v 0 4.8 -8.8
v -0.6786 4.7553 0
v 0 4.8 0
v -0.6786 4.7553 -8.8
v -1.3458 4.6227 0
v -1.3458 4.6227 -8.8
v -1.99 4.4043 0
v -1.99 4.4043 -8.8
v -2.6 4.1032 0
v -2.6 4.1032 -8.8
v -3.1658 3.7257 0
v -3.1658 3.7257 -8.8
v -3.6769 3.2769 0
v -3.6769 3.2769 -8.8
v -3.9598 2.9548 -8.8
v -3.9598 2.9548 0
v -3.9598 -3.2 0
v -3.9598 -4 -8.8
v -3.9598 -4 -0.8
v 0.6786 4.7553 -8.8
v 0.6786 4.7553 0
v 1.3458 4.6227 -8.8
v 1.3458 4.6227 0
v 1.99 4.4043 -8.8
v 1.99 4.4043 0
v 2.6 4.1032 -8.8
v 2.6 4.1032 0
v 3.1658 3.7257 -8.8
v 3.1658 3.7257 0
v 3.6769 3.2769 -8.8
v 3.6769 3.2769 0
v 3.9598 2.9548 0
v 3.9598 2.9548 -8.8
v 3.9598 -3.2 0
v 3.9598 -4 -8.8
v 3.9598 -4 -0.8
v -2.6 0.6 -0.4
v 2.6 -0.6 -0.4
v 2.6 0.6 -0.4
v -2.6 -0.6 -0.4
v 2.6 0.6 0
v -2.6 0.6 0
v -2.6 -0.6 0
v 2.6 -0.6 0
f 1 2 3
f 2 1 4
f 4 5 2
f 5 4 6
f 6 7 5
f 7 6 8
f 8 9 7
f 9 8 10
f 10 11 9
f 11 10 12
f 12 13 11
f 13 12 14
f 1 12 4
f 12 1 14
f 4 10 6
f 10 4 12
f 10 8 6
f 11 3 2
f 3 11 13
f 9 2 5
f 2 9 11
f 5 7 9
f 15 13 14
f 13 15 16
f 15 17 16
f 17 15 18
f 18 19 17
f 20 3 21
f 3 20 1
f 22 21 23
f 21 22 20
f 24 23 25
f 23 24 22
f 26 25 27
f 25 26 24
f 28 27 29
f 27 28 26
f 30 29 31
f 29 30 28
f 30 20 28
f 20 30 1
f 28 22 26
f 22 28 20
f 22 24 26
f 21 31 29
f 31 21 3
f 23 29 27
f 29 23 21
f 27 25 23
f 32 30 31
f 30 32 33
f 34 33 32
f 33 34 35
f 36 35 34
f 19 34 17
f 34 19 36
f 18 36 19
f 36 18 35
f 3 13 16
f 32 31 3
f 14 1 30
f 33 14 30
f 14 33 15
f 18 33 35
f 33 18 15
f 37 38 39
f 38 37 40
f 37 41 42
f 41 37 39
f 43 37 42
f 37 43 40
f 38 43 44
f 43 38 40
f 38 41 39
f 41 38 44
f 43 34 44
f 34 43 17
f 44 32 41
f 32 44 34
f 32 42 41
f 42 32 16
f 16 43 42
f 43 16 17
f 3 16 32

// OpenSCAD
// file: ../p/48/1-8edge.scad
use <../../lib.scad>
function ldraw_lib__48__1_8edge() = [
// 0 Hi-Res Circle 0.125
// 0 Name: 48\1-8edge.dat
// 0 Author: [PTadmin]
// 0 !LDRAW_ORG 48_Primitive UPDATE 2017-01
// 0 !LICENSE Licensed under CC BY 4.0 : see CAreadme.txt
// 
// 0 BFC CERTIFY CCW
  [0,"BFC","CERTIFY"],
  [0,"BFC","CCW"],
// 
// 0 !HISTORY 2000-09-30 [PTadmin] Official Update 2000-02
// 0 !HISTORY 2007-10-13 [PTadmin] Header formatted for Contributor Agreement
// 0 !HISTORY 2008-07-01 [PTadmin] Official Update 2008-01
// 0 !HISTORY 2017-01-17 [Steffen] added BFC CERTIFY statement
// 0 !HISTORY 2017-12-30 [PTadmin] Official Update 2017-01
// 
// 
// 2 24 1 0 0 0.9914 0 0.1305
  [2,24,1,0,0,0.9914,0,0.1305],
// 2 24 0.9914 0 0.1305 0.9659 0 0.2588
  [2,24,0.9914,0,0.1305,0.9659,0,0.2588],
// 2 24 0.9659 0 0.2588 0.9239 0 0.3827
  [2,24,0.9659,0,0.2588,0.9239,0,0.3827],
// 2 24 0.9239 0 0.3827 0.866 0 0.5
  [2,24,0.9239,0,0.3827,0.866,0,0.5],
// 2 24 0.866 0 0.5 0.7934 0 0.6088
  [2,24,0.866,0,0.5,0.7934,0,0.6088],
// 2 24 0.7934 0 0.6088 0.7071 0 0.7071
  [2,24,0.7934,0,0.6088,0.7071,0,0.7071],
];
module ldraw_lib__48__1_8edge(step=0, col=false, unit=2/5, alt=false, line=0.2, solid=!$preview)
    makepoly(ldraw_lib__48__1_8edge(), step=step, col=col, unit=unit, alt=alt, line=line, solid=solid);
ldraw_lib__48__1_8edge(line=0.2);
// file: ../p/48/1-8cyli.scad
use <../../lib.scad>
function ldraw_lib__48__1_8cyli() = [
// 0 Hi-Res Cylinder 0.125
// 0 Name: 48\1-8cyli.dat
// 0 Author: Steve Bliss [sbliss]
// 0 !LDRAW_ORG 48_Primitive UPDATE 2004-04
// 0 !LICENSE Licensed under CC BY 4.0 : see CAreadme.txt
// 
// 0 BFC CERTIFY CCW
  [0,"BFC","CERTIFY"],
  [0,"BFC","CCW"],
// 
// 0 !HISTORY 2000-05-07 [PTadmin] Official Update 2000-01
// 0 !HISTORY 2004-10-12 [sbliss] fixed title, BFC'ed
// 0 !HISTORY 2004-11-06 [PTadmin] Official Update 2004-04
// 0 !HISTORY 2007-06-24 [PTadmin] Header formatted for Contributor Agreement
// 0 !HISTORY 2008-07-01 [PTadmin] Official Update 2008-01
// 
// 
// 5 24 1 0 0 1 1 0 0.9914 0 0.1305 1 0 -1
  [5,24,1,0,0,1,1,0,0.9914,0,0.1305,1,0,-1],
// 5 24 0.9914 0 0.1305 0.9914 1 0.1305 0.9659 0 0.2588 1 0 0
  [5,24,0.9914,0,0.1305,0.9914,1,0.1305,0.9659,0,0.2588,1,0,0],
// 5 24 0.9659 0 0.2588 0.9659 1 0.2588 0.9239 0 0.3827 0.9914 0 0.1305
  [5,24,0.9659,0,0.2588,0.9659,1,0.2588,0.9239,0,0.3827,0.9914,0,0.1305],
// 5 24 0.9239 0 0.3827 0.9239 1 0.3827 0.8660 0 0.5000 0.9659 0 0.2588
  [5,24,0.9239,0,0.3827,0.9239,1,0.3827,0.8660,0,0.5000,0.9659,0,0.2588],
// 5 24 0.8660 0 0.5000 0.8660 1 0.5000 0.7934 0 0.6088 0.9239 0 0.3827
  [5,24,0.8660,0,0.5000,0.8660,1,0.5000,0.7934,0,0.6088,0.9239,0,0.3827],
// 5 24 0.7934 0 0.6088 0.7934 1 0.6088 0.7071 0 0.7071 0.8660 0 0.5000
  [5,24,0.7934,0,0.6088,0.7934,1,0.6088,0.7071,0,0.7071,0.8660,0,0.5000],
// 5 24 0.7071 0 0.7071 0.7071 1 0.7071 0.6088 0 0.7934 0.7934 0 0.6088
  [5,24,0.7071,0,0.7071,0.7071,1,0.7071,0.6088,0,0.7934,0.7934,0,0.6088],
// 
// 4 16 0.9914 1 0.1305 0.9914 0 0.1305 1 0 0 1 1 0
  [4,16,0.9914,1,0.1305,0.9914,0,0.1305,1,0,0,1,1,0],
// 4 16 0.9659 1 0.2588 0.9659 0 0.2588 0.9914 0 0.1305 0.9914 1 0.1305
  [4,16,0.9659,1,0.2588,0.9659,0,0.2588,0.9914,0,0.1305,0.9914,1,0.1305],
// 4 16 0.9239 1 0.3827 0.9239 0 0.3827 0.9659 0 0.2588 0.9659 1 0.2588
  [4,16,0.9239,1,0.3827,0.9239,0,0.3827,0.9659,0,0.2588,0.9659,1,0.2588],
// 4 16 0.8660 1 0.5000 0.8660 0 0.5000 0.9239 0 0.3827 0.9239 1 0.3827
  [4,16,0.8660,1,0.5000,0.8660,0,0.5000,0.9239,0,0.3827,0.9239,1,0.3827],
// 4 16 0.7934 1 0.6088 0.7934 0 0.6088 0.8660 0 0.5000 0.8660 1 0.5000
  [4,16,0.7934,1,0.6088,0.7934,0,0.6088,0.8660,0,0.5000,0.8660,1,0.5000],
// 4 16 0.7071 1 0.7071 0.7071 0 0.7071 0.7934 0 0.6088 0.7934 1 0.6088
  [4,16,0.7071,1,0.7071,0.7071,0,0.7071,0.7934,0,0.6088,0.7934,1,0.6088],
// 0
];
module ldraw_lib__48__1_8cyli(step=0, col=false, unit=2/5, alt=false, line=0.2, solid=!$preview)
    makepoly(ldraw_lib__48__1_8cyli(), step=step, col=col, unit=unit, alt=alt, line=line, solid=solid);
ldraw_lib__48__1_8cyli(line=0.2);
// file: ../p/rect3.scad
use <../lib.scad>
function ldraw_lib__rect3() = [
// 0 Rectangle with 3 Edges
// 0 Name: rect3.dat
// 0 Author: Mark Kennedy [mkennedy]
// 0 !LDRAW_ORG Primitive UPDATE 2010-01
// 0 !LICENSE Licensed under CC BY 4.0 : see CAreadme.txt
// 
// 0 BFC CERTIFY CCW
  [0,"BFC","CERTIFY"],
  [0,"BFC","CCW"],
// 
// 0 !HISTORY 2003-08-01 [PTadmin] Official Update 2003-02
// 0 !HISTORY 2007-06-24 [PTadmin] Header formatted for Contributor Agreement
// 0 !HISTORY 2008-07-01 [PTadmin] Official Update 2008-01
// 0 !HISTORY 2010-01-17 [mikeheide] Change winding to CCW
// 0 !HISTORY 2010-04-05 [PTadmin] Official Update 2010-01
// 
// 
// 2 24 1 0 1 -1 0 1
  [2,24,1,0,1,-1,0,1],
// 2 24 1 0 1 1 0 -1
  [2,24,1,0,1,1,0,-1],
// 2 24 -1 0 1 -1 0 -1
  [2,24,-1,0,1,-1,0,-1],
// 4 16 -1 0 1 -1 0 -1 1 0 -1 1 0 1
  [4,16,-1,0,1,-1,0,-1,1,0,-1,1,0,1],
// 0 //
];
module ldraw_lib__rect3(step=0, col=false, unit=2/5, alt=false, line=0.2, solid=!$preview)
    makepoly(ldraw_lib__rect3(), step=step, col=col, unit=unit, alt=alt, line=line, solid=solid);
ldraw_lib__rect3(line=0.2);
// file: ../p/rect2p.scad
use <../lib.scad>
function ldraw_lib__rect2p() = [
// 0 Rectangle with 2 Parallel Edges
// 0 Name: rect2p.dat
// 0 Author: Donald Sutter [technog]
// 0 !LDRAW_ORG Primitive UPDATE 2010-01
// 0 !LICENSE Licensed under CC BY 4.0 : see CAreadme.txt
// 
// 0 BFC CERTIFY CCW
  [0,"BFC","CERTIFY"],
  [0,"BFC","CCW"],
// 
// 0 !HISTORY 2003-08-01 [PTadmin] Official Update 2003-02
// 0 !HISTORY 2007-06-24 [PTadmin] Header formatted for Contributor Agreement
// 0 !HISTORY 2008-07-01 [PTadmin] Official Update 2008-01
// 0 !HISTORY 2010-01-17 [mikeheide] changed winding to CCW
// 0 !HISTORY 2010-04-05 [PTadmin] Official Update 2010-01
// 
// 
// 2 24 1 0 1 -1 0 1
  [2,24,1,0,1,-1,0,1],
// 2 24 -1 0 -1 1 0 -1
  [2,24,-1,0,-1,1,0,-1],
// 4 16 -1 0 1 -1 0 -1 1 0 -1 1 0 1
  [4,16,-1,0,1,-1,0,-1,1,0,-1,1,0,1],
// 0
];
module ldraw_lib__rect2p(step=0, col=false, unit=2/5, alt=false, line=0.2, solid=!$preview)
    makepoly(ldraw_lib__rect2p(), step=step, col=col, unit=unit, alt=alt, line=line, solid=solid);
ldraw_lib__rect2p(line=0.2);
// file: ../p/rect.scad
use <../lib.scad>
function ldraw_lib__rect() = [
// 0 Rectangle
// 0 Name: rect.dat
// 0 Author: James Jessiman
// 0 !LDRAW_ORG Primitive UPDATE 2010-01
// 0 !LICENSE Licensed under CC BY 2.0 and CC BY 4.0 : see CAreadme.txt
// 
// 0 BFC CERTIFY CCW
  [0,"BFC","CERTIFY"],
  [0,"BFC","CCW"],
// 
// 0 !HISTORY 2002-04-05 [hafhead] Added BFC statement
// 0 !HISTORY 2002-04-25 [PTadmin] Official Update 2002-02
// 0 !HISTORY 2007-06-24 [PTadmin] Header formatted for Contributor Agreement
// 0 !HISTORY 2008-07-01 [PTadmin] Official Update 2008-01
// 0 !HISTORY 2010-01-17 [mikeheide] changed winding to CCW
// 0 !HISTORY 2010-04-05 [PTadmin] Official Update 2010-01
// 
// 
// 2 24 1 0 1 -1 0 1
  [2,24,1,0,1,-1,0,1],
// 2 24 -1 0 1 -1 0 -1
  [2,24,-1,0,1,-1,0,-1],
// 2 24 -1 0 -1 1 0 -1
  [2,24,-1,0,-1,1,0,-1],
// 2 24 1 0 -1 1 0 1
  [2,24,1,0,-1,1,0,1],
// 4 16 -1 0 1 -1 0 -1 1 0 -1 1 0 1
  [4,16,-1,0,1,-1,0,-1,1,0,-1,1,0,1],
// 0
];
module ldraw_lib__rect(step=0, col=false, unit=2/5, alt=false, line=0.2, solid=!$preview)
    makepoly(ldraw_lib__rect(), step=step, col=col, unit=unit, alt=alt, line=line, solid=solid);
ldraw_lib__rect(line=0.2);
// file: ../p/48/1-8cylo.scad
use <../../lib.scad>
use <1-8cyli.scad>
use <1-8edge.scad>
function ldraw_lib__48__1_8cylo() = [
// 0 Hi-Res Cylinder Open 0.125
// 0 Name: 48\1-8cylo.dat
// 0 Author: Max Martin Richter [MMR1988]
// 0 !LDRAW_ORG 48_Primitive UPDATE 2014-01
// 0 !LICENSE Licensed under CC BY 4.0 : see CAreadme.txt
// 
// 0 BFC CERTIFY CCW
  [0,"BFC","CERTIFY"],
  [0,"BFC","CCW"],
// 
// 0 !HISTORY 2014-06-21 [PTadmin] Official Update 2014-01
// 
// 
// 1 16 0 0 0 1 0 0 0 1 0 0 0 1 48\1-8edge.dat
  [1,16,0,0,0,1,0,0,0,1,0,0,0,1, ldraw_lib__48__1_8edge()],
// 1 16 0 1 0 1 0 0 0 1 0 0 0 1 48\1-8edge.dat
  [1,16,0,1,0,1,0,0,0,1,0,0,0,1, ldraw_lib__48__1_8edge()],
// 1 16 0 0 0 1 0 0 0 1 0 0 0 1 48\1-8cyli.dat
  [1,16,0,0,0,1,0,0,0,1,0,0,0,1, ldraw_lib__48__1_8cyli()],
];
module ldraw_lib__48__1_8cylo(step=0, col=false, unit=2/5, alt=false, line=0.2, solid=!$preview)
    makepoly(ldraw_lib__48__1_8cylo(), step=step, col=col, unit=unit, alt=alt, line=line, solid=solid);
ldraw_lib__48__1_8cylo(line=0.2);
// file: ../p/48/1-8chrd.scad
use <../../lib.scad>
function ldraw_lib__48__1_8chrd() = [
// 0 Hi-Res Chord 0.125
// 0 Name: 48\1-8chrd.dat
// 0 Author: Guy Vivan [guyvivan]
// 0 !LDRAW_ORG 48_Primitive UPDATE 2009-01
// 0 !LICENSE Licensed under CC BY 2.0 and CC BY 4.0 : see CAreadme.txt
// 
// 0 BFC CERTIFY CCW
  [0,"BFC","CERTIFY"],
  [0,"BFC","CCW"],
// 
// 0 !HISTORY 2009-05-02 [PTadmin] Official Update 2009-01
// 
// 
// 4 16 1 0 0 0.9914 0 0.1305 0.7934 0 0.6088 0.7071 0 0.7071
  [4,16,1,0,0,0.9914,0,0.1305,0.7934,0,0.6088,0.7071,0,0.7071],
// 4 16 0.9914 0 0.1305 0.9659 0 0.2588 0.866 0 0.5 0.7934 0 0.6088
  [4,16,0.9914,0,0.1305,0.9659,0,0.2588,0.866,0,0.5,0.7934,0,0.6088],
// 3 16 0.9659 0 0.2588 0.9239 0 0.3827 0.866 0 0.5
  [3,16,0.9659,0,0.2588,0.9239,0,0.3827,0.866,0,0.5],
// 0
];
module ldraw_lib__48__1_8chrd(step=0, col=false, unit=2/5, alt=false, line=0.2, solid=!$preview)
    makepoly(ldraw_lib__48__1_8chrd(), step=step, col=col, unit=unit, alt=alt, line=line, solid=solid);
ldraw_lib__48__1_8chrd(line=0.2);
// file: s/35543s01.scad
use <../../lib.scad>
use <../../p/48/1-8chrd.scad>
use <../../p/48/1-8cylo.scad>
use <../../p/rect.scad>
use <../../p/rect2p.scad>
use <../../p/rect3.scad>
function ldraw_lib__s__35543s01() = [
// 0 ~Electric Powered Up Remote Handset Control Button without Top
// 0 Name: s\35543s01.dat
// 0 Author: Philippe Hurbain [Philo]
// 0 !LDRAW_ORG Subpart UPDATE 2020-01
// 0 !LICENSE Licensed under CC BY 4.0 : see CAreadme.txt
// 
// 0 BFC CERTIFY CCW
  [0,"BFC","CERTIFY"],
  [0,"BFC","CCW"],
// 
// 0 !HISTORY 2020-06-28 [PTadmin] Official Update 2020-01
// 
// 
// 1 16 0 22 -1 0 0 -13 0 -22 0 13 0 0 48\1-8cylo.dat
  [1,16,0,22,-1,0,0,-13,0,-22,0,13,0,0, ldraw_lib__48__1_8cylo()],
// 1 16 0 22 -1 0 0 -13 0 -1 0 13 0 0 48\1-8chrd.dat
  [1,16,0,22,-1,0,0,-13,0,-1,0,13,0,0, ldraw_lib__48__1_8chrd()],
// 1 16 0 0 -1 0 0 -13 0 1 0 13 0 0 48\1-8chrd.dat
  [1,16,0,0,-1,0,0,-13,0,1,0,13,0,0, ldraw_lib__48__1_8chrd()],
// 1 16 -9.54585 11 7.7896 0 1 -0.35355 11 0 0 0 0 -0.4027 rect3.dat
  [1,16,-9.54585,11,7.7896,0,1,-0.35355,11,0,0,0,0,-0.4027, ldraw_lib__rect3()],
// 4 16 -9.8994 0 -8 -9.8994 0 7.3869 -9.8994 22 7.3869 -9.8994 22 -10
  [4,16,-9.8994,0,-8,-9.8994,0,7.3869,-9.8994,22,7.3869,-9.8994,22,-10],
// 2 24 -9.8994 0 -8 -9.8994 0 7.3869
  [2,24,-9.8994,0,-8,-9.8994,0,7.3869],
// 3 16 -9.8994 22 -10 -9.8994 2 -10 -9.8994 0 -8
  [3,16,-9.8994,22,-10,-9.8994,2,-10,-9.8994,0,-8],
// 1 16 0 22 -1 0 0 13 0 -22 0 13 0 0 48\1-8cylo.dat
  [1,16,0,22,-1,0,0,13,0,-22,0,13,0,0, ldraw_lib__48__1_8cylo()],
// 1 16 0 22 -1 0 0 13 0 -1 0 13 0 0 48\1-8chrd.dat
  [1,16,0,22,-1,0,0,13,0,-1,0,13,0,0, ldraw_lib__48__1_8chrd()],
// 1 16 0 0 -1 0 0 13 0 1 0 13 0 0 48\1-8chrd.dat
  [1,16,0,0,-1,0,0,13,0,1,0,13,0,0, ldraw_lib__48__1_8chrd()],
// 1 16 9.54585 11 7.7896 0 -1 0.35355 -11 0 0 0 0 -0.4027 rect3.dat
  [1,16,9.54585,11,7.7896,0,-1,0.35355,-11,0,0,0,0,-0.4027, ldraw_lib__rect3()],
// 4 16 9.8994 22 7.3869 9.8994 0 7.3869 9.8994 0 -8 9.8994 22 -10
  [4,16,9.8994,22,7.3869,9.8994,0,7.3869,9.8994,0,-8,9.8994,22,-10],
// 2 24 9.8994 0 -8 9.8994 0 7.3869
  [2,24,9.8994,0,-8,9.8994,0,7.3869],
// 3 16 9.8994 2 -10 9.8994 22 -10 9.8994 0 -8
  [3,16,9.8994,2,-10,9.8994,22,-10,9.8994,0,-8],
// 1 16 0 1 -9 9.8994 0 0 0 1 -1 0 0 1 rect.dat
  [1,16,0,1,-9,9.8994,0,0,0,1,-1,0,0,1, ldraw_lib__rect()],
// 1 16 0 12 -10 -9.8994 0 0 0 0 10 0 1 0 rect3.dat
  [1,16,0,12,-10,-9.8994,0,0,0,0,10,0,1,0, ldraw_lib__rect3()],
// 3 16 0 0 12 -9.1923 0 8.1923 -9.8994 0 7.3869
  [3,16,0,0,12,-9.1923,0,8.1923,-9.8994,0,7.3869],
// 3 16 9.8994 0 7.3869 9.1923 0 8.1923 0 0 12
  [3,16,9.8994,0,7.3869,9.1923,0,8.1923,0,0,12],
// 3 16 -9.1923 22 8.1923 0 22 12 9.1923 22 8.1923
  [3,16,-9.1923,22,8.1923,0,22,12,9.1923,22,8.1923],
// 4 16 9.8994 22 7.3869 -9.8994 22 7.3869 -9.1923 22 8.1923 9.1923 22 8.1923
  [4,16,9.8994,22,7.3869,-9.8994,22,7.3869,-9.1923,22,8.1923,9.1923,22,8.1923],
// 1 16 0 22 -1.30655 0 0 -9.8994 0 -1 0 -8.69345 0 0 rect2p.dat
  [1,16,0,22,-1.30655,0,0,-9.8994,0,-1,0,-8.69345,0,0, ldraw_lib__rect2p()],
];
module ldraw_lib__s__35543s01(step=0, col=false, unit=2/5, alt=false, line=0.2, solid=!$preview)
    makepoly(ldraw_lib__s__35543s01(), step=step, col=col, unit=unit, alt=alt, line=line, solid=solid);
ldraw_lib__s__35543s01(line=0.2);
// file: ../p/box5.scad
use <../lib.scad>
function ldraw_lib__box5() = [
// 0 Box with 5 Faces and All Edges
// 0 Name: box5.dat
// 0 Author: James Jessiman
// 0 !LDRAW_ORG Primitive UPDATE 2012-01
// 0 !LICENSE Licensed under CC BY 4.0 : see CAreadme.txt
// 
// 0 BFC CERTIFY CCW
  [0,"BFC","CERTIFY"],
  [0,"BFC","CCW"],
// 
// 0 !HISTORY 2002-04-03 [sbliss] Modified for BFC compliance
// 0 !HISTORY 2002-04-25 [PTadmin] Official Update 2002-02
// 0 !HISTORY 2007-06-24 [PTadmin] Header formatted for Contributor Agreement
// 0 !HISTORY 2008-07-01 [PTadmin] Official Update 2008-01
// 0 !HISTORY 2012-02-16 [Philo] Changed to CCW
// 0 !HISTORY 2012-03-30 [PTadmin] Official Update 2012-01
// 
// 
// 2 24 1 1 1 -1 1 1
  [2,24,1,1,1,-1,1,1],
// 2 24 -1 1 1 -1 1 -1
  [2,24,-1,1,1,-1,1,-1],
// 2 24 -1 1 -1 1 1 -1
  [2,24,-1,1,-1,1,1,-1],
// 2 24 1 1 -1 1 1 1
  [2,24,1,1,-1,1,1,1],
// 2 24 1 0 1 -1 0 1
  [2,24,1,0,1,-1,0,1],
// 2 24 -1 0 1 -1 0 -1
  [2,24,-1,0,1,-1,0,-1],
// 2 24 -1 0 -1 1 0 -1
  [2,24,-1,0,-1,1,0,-1],
// 2 24 1 0 -1 1 0 1
  [2,24,1,0,-1,1,0,1],
// 2 24 1 0 1 1 1 1
  [2,24,1,0,1,1,1,1],
// 2 24 -1 0 1 -1 1 1
  [2,24,-1,0,1,-1,1,1],
// 2 24 1 0 -1 1 1 -1
  [2,24,1,0,-1,1,1,-1],
// 2 24 -1 0 -1 -1 1 -1
  [2,24,-1,0,-1,-1,1,-1],
// 4 16 -1 1 1 1 1 1 1 1 -1 -1 1 -1
  [4,16,-1,1,1,1,1,1,1,1,-1,-1,1,-1],
// 4 16 -1 1 1 -1 0 1 1 0 1 1 1 1
  [4,16,-1,1,1,-1,0,1,1,0,1,1,1,1],
// 4 16 -1 1 -1 -1 0 -1 -1 0 1 -1 1 1
  [4,16,-1,1,-1,-1,0,-1,-1,0,1,-1,1,1],
// 4 16 1 1 -1 1 0 -1 -1 0 -1 -1 1 -1
  [4,16,1,1,-1,1,0,-1,-1,0,-1,-1,1,-1],
// 4 16 1 1 1 1 0 1 1 0 -1 1 1 -1
  [4,16,1,1,1,1,0,1,1,0,-1,1,1,-1],
];
module ldraw_lib__box5(step=0, col=false, unit=2/5, alt=false, line=0.2, solid=!$preview)
    makepoly(ldraw_lib__box5(), step=step, col=col, unit=unit, alt=alt, line=line, solid=solid);
ldraw_lib__box5(line=0.2);
// main file
use <../lib.scad>
use <../p/box5.scad>
use <s/35543s01.scad>
function ldraw_lib__35545() = [
// 0 ~Electric Powered Up Remote Handset "-" Control Button
// 0 Name: 35545.dat
// 0 Author: Philippe Hurbain [Philo]
// 0 !LDRAW_ORG Part UPDATE 2020-01
// 0 !LICENSE Licensed under CC BY 4.0 : see CAreadme.txt
// 
// 0 BFC CERTIFY CCW
  [0,"BFC","CERTIFY"],
  [0,"BFC","CCW"],
// 
// 0 !HISTORY 2020-06-28 [PTadmin] Official Update 2020-01
// 
// 
// 1 16 0 0 0 1 0 0 0 1 0 0 0 1 s\35543s01.dat
  [1,16,0,0,0,1,0,0,0,1,0,0,0,1, ldraw_lib__s__35543s01()],
// 0 BFC INVERTNEXT
  [0,"BFC","INVERTNEXT"],
// 1 16 0 0 0 6.5 0 0 0 1 0 0 0 1.5 box5.dat
  [1,16,0,0,0,6.5,0,0,0,1,0,0,0,1.5, ldraw_lib__box5()],
// 4 16 6.5 0 -1.5 -6.5 0 -1.5 -9.8994 0 -8 9.8994 0 -8
  [4,16,6.5,0,-1.5,-6.5,0,-1.5,-9.8994,0,-8,9.8994,0,-8],
// 4 16 6.5 0 1.5 6.5 0 -1.5 9.8994 0 -8 9.8994 0 7.3869
  [4,16,6.5,0,1.5,6.5,0,-1.5,9.8994,0,-8,9.8994,0,7.3869],
// 4 16 -9.8994 0 7.3869 -6.5 0 1.5 6.5 0 1.5 9.8994 0 7.3869
  [4,16,-9.8994,0,7.3869,-6.5,0,1.5,6.5,0,1.5,9.8994,0,7.3869],
// 4 16 -6.5 0 -1.5 -6.5 0 1.5 -9.8994 0 7.3869 -9.8994 0 -8
  [4,16,-6.5,0,-1.5,-6.5,0,1.5,-9.8994,0,7.3869,-9.8994,0,-8],
// 3 16 0 0 12 -9.8994 0 7.3869 9.8994 0 7.3869
  [3,16,0,0,12,-9.8994,0,7.3869,9.8994,0,7.3869],
];
module ldraw_lib__35545(step=0, col=false, unit=2/5, alt=false, line=0.2, solid=!$preview)
    makepoly(ldraw_lib__35545(), step=step, col=col, unit=unit, alt=alt, line=line, solid=solid);
ldraw_lib__35545(line=0.2);
